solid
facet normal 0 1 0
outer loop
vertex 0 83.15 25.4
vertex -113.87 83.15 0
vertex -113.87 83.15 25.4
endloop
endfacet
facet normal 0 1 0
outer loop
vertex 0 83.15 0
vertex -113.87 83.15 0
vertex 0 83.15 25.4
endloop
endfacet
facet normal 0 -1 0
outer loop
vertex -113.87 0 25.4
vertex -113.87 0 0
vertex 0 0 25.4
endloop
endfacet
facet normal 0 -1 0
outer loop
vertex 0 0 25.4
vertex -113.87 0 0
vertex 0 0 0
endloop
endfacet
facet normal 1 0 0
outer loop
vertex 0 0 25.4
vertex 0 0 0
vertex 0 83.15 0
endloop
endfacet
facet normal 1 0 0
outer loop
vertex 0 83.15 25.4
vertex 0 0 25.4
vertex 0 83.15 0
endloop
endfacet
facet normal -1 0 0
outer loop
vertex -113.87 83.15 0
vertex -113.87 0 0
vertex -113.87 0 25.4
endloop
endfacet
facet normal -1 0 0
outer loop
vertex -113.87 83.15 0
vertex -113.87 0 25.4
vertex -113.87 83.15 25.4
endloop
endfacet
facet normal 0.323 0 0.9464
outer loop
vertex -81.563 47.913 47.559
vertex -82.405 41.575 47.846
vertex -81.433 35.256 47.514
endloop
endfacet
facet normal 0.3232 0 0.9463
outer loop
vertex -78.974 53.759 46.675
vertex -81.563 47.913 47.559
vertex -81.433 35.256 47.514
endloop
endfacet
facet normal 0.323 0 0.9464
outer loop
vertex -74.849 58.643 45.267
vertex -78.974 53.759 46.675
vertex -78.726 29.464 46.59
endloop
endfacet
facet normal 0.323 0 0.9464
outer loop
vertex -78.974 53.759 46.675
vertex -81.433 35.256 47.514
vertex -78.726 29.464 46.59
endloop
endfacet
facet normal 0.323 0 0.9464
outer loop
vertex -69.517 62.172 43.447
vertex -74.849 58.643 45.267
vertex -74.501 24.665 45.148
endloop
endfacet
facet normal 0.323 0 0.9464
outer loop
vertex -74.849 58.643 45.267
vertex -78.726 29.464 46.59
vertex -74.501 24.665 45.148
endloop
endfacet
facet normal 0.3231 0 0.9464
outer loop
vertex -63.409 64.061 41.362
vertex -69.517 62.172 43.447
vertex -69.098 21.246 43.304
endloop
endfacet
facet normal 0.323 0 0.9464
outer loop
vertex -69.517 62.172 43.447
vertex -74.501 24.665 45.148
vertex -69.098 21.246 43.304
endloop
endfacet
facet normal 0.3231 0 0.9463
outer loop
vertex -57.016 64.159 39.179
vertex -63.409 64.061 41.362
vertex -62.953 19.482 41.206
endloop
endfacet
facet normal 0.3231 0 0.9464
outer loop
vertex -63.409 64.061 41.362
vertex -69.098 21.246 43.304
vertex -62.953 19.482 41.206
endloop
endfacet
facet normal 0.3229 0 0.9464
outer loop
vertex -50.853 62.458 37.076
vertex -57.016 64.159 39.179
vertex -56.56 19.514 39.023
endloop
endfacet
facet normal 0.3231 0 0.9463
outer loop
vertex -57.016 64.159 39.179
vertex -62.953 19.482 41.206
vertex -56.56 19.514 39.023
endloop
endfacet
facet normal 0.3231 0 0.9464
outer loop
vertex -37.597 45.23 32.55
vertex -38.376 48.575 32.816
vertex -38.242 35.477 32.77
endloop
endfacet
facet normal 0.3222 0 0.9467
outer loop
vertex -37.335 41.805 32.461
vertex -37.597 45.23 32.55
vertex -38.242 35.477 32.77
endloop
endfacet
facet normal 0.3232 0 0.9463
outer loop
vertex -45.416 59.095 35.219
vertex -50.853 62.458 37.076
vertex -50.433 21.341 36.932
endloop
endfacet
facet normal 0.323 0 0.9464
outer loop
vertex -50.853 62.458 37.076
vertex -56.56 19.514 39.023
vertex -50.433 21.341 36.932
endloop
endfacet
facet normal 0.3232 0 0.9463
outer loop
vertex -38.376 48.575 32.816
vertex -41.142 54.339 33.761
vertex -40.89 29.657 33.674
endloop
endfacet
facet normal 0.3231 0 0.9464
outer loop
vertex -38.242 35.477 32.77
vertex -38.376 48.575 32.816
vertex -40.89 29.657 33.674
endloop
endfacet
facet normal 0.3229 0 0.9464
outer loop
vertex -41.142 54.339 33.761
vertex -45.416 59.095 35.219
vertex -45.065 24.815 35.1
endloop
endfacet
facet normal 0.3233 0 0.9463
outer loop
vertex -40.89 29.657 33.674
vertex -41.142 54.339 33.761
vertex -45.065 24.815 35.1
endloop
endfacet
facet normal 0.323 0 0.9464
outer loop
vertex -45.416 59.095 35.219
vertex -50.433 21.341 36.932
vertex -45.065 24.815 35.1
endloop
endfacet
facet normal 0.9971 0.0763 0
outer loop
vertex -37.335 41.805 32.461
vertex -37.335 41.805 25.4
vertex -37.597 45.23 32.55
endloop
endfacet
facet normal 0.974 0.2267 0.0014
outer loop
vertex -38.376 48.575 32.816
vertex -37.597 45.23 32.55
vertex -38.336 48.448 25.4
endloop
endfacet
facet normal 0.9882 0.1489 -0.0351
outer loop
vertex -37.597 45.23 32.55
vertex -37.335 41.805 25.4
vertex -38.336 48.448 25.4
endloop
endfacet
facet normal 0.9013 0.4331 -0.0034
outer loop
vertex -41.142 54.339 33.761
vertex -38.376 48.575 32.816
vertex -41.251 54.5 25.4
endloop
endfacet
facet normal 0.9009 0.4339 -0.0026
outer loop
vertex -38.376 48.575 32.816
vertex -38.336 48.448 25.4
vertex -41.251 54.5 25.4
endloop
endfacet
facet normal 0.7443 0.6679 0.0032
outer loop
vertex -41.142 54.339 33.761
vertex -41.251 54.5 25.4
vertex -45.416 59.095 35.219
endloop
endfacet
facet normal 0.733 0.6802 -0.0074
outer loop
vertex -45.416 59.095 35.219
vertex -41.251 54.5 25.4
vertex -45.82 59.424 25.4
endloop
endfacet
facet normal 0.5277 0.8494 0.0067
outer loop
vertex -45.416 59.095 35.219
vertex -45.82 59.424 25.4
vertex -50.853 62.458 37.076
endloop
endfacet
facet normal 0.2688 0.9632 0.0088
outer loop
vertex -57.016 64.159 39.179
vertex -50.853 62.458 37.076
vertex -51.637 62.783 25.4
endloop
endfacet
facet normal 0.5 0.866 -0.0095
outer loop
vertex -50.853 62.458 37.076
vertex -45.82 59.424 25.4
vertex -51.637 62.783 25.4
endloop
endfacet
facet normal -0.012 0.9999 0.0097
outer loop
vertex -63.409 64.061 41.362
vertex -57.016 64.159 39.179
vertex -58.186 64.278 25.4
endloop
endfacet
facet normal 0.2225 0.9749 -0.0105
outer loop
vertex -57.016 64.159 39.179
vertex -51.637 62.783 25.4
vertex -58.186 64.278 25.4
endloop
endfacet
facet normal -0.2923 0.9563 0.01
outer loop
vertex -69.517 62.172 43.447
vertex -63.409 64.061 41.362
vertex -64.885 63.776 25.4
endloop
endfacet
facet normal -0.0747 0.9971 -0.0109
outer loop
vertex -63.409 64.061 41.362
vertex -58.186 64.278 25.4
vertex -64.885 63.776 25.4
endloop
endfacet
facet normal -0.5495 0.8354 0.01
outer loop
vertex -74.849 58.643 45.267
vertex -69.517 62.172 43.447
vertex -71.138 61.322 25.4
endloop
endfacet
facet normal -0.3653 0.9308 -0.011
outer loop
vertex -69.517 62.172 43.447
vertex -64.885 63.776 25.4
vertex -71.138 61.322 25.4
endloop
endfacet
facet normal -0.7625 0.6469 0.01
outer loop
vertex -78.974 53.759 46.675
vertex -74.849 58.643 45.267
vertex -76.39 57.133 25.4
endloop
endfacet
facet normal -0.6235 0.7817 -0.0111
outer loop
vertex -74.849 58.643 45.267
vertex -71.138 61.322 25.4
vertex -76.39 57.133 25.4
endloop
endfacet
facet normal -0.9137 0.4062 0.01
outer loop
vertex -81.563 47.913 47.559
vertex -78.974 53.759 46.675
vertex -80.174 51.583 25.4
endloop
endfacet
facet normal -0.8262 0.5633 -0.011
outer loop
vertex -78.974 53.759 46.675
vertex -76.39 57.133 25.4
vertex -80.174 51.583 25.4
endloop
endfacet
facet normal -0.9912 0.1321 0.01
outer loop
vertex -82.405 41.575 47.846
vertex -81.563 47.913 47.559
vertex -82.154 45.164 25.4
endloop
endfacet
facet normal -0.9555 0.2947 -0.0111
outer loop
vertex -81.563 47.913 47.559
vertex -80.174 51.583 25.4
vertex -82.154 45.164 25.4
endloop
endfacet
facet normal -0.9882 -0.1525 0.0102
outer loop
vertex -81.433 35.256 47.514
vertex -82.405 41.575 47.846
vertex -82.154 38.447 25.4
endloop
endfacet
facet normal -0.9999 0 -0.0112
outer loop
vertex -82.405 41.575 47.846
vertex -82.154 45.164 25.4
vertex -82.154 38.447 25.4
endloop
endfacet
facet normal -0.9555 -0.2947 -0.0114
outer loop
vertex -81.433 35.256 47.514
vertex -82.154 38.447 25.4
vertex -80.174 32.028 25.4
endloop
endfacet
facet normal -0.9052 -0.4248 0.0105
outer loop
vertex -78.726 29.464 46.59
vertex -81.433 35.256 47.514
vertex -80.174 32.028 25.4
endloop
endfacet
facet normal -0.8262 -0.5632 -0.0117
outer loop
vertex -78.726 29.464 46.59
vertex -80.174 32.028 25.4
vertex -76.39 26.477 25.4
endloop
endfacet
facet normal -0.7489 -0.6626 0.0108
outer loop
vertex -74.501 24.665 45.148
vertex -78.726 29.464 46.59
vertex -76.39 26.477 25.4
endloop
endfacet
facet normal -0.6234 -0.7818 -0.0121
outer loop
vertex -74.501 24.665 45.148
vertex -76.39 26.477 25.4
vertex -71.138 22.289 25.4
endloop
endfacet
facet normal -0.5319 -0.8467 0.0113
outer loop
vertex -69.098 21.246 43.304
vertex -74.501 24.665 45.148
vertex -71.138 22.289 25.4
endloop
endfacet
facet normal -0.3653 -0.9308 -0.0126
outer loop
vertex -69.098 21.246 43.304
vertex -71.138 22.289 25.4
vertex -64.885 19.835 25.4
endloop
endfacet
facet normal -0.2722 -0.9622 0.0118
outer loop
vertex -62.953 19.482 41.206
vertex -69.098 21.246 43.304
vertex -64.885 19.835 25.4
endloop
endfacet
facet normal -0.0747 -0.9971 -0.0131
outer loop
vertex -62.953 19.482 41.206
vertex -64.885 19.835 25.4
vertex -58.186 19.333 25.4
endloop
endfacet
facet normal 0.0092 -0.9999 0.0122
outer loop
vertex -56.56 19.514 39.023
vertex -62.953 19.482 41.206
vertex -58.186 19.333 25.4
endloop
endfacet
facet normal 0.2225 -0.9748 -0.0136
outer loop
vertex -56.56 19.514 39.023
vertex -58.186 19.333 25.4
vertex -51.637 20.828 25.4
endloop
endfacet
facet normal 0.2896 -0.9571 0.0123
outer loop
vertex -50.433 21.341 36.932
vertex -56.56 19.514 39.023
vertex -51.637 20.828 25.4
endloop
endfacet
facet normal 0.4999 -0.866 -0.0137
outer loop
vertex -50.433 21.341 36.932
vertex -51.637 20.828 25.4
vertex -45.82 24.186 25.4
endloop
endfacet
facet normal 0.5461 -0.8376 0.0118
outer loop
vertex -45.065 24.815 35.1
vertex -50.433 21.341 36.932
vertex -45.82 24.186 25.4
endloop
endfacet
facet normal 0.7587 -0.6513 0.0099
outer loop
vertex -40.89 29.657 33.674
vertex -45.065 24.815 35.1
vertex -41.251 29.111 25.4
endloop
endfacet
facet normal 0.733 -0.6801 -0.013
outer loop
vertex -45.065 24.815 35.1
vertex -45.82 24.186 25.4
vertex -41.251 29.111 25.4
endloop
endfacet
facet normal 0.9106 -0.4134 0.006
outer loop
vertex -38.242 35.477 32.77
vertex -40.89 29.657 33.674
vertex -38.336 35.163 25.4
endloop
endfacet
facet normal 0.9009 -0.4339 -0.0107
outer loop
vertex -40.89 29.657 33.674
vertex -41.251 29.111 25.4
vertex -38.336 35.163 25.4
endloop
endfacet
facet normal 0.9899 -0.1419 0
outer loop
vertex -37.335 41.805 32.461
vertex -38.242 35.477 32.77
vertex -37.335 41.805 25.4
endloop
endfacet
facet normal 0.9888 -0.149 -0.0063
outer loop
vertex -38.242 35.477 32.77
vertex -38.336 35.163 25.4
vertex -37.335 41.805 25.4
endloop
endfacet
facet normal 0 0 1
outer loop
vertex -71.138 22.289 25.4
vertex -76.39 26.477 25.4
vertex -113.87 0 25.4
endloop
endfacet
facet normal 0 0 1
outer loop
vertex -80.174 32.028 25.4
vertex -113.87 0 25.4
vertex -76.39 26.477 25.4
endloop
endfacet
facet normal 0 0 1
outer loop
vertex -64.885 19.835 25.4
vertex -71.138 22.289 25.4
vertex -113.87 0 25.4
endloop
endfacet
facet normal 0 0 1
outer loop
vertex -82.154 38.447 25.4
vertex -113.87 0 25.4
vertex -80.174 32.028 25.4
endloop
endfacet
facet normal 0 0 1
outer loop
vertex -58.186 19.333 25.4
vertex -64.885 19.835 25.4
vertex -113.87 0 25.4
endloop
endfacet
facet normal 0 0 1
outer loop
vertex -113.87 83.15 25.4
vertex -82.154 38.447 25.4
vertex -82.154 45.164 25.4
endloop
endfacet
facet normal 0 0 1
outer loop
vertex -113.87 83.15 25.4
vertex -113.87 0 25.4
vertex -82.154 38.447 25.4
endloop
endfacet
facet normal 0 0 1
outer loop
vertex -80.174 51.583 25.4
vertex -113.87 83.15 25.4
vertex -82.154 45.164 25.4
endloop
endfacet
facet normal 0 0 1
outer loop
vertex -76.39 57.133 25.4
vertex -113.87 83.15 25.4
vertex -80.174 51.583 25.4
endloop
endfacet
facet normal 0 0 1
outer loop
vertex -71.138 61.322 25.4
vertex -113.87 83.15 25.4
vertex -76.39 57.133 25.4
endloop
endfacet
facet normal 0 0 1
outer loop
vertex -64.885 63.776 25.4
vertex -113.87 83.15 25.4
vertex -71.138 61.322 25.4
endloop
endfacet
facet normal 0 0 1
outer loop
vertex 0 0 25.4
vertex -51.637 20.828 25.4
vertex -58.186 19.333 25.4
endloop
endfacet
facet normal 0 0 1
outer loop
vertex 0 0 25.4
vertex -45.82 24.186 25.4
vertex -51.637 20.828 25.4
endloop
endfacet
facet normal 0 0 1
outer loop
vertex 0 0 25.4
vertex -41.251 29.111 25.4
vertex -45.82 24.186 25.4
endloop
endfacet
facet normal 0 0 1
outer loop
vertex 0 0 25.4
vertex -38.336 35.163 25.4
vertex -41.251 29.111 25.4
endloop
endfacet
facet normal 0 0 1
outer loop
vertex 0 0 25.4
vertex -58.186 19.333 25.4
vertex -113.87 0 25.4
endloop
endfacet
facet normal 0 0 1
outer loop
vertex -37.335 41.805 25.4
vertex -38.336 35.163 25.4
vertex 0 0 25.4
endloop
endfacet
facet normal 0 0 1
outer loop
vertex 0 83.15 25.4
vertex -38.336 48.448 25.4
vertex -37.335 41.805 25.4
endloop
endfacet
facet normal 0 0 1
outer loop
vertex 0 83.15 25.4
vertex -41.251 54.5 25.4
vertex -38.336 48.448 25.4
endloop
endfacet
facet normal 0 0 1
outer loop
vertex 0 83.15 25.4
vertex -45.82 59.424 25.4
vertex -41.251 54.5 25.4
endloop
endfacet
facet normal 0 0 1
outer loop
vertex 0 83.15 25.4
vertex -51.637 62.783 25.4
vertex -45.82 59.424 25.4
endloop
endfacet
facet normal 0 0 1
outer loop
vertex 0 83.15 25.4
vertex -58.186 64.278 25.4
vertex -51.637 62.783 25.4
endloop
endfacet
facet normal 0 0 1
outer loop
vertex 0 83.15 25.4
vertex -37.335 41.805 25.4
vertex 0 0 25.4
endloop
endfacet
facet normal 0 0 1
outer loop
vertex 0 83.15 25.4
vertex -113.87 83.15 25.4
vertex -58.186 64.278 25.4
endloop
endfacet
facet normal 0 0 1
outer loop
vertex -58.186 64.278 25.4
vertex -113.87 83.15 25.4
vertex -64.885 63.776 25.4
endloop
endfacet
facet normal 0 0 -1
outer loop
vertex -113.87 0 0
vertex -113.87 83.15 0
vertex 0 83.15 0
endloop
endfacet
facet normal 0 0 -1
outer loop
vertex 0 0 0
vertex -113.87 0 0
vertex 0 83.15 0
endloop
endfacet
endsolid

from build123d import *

# Parameters (mm, degrees)
F0_W     = 113.869563
F0_H     = 83.149798
F1_DEPTH = 25.4
F2_R     = 22.535433
F3_DEPTH = 25.4
F5_DEPTH = 76.2


with BuildPart() as f1:
    # F0 (on Top) → F1 (new body)
    with BuildSketch(Plane.XY):
        with Locations((-56.934781, 41.574899)):
            Rectangle(F0_W, F0_H)
    extrude(amount=F1_DEPTH)

    # F2 (on face) → F3 (join)
    with BuildSketch(Plane.XY.offset(25.4)):
        with Locations((-59.87053, 41.805387)):
            Circle(F2_R)
    extrude(amount=F3_DEPTH)

    # F4 (on Front) → F5 (cut)
    with BuildSketch(Plane.XZ):
        Polygon((-102.13092, 49.10665), (-86.741515, 49.326494), (-31.999189, 30.639356), (-31.999189, 64.935751), align=None)
    extrude(amount=-F5_DEPTH, mode=Mode.SUBTRACT)


solid = f1.part
